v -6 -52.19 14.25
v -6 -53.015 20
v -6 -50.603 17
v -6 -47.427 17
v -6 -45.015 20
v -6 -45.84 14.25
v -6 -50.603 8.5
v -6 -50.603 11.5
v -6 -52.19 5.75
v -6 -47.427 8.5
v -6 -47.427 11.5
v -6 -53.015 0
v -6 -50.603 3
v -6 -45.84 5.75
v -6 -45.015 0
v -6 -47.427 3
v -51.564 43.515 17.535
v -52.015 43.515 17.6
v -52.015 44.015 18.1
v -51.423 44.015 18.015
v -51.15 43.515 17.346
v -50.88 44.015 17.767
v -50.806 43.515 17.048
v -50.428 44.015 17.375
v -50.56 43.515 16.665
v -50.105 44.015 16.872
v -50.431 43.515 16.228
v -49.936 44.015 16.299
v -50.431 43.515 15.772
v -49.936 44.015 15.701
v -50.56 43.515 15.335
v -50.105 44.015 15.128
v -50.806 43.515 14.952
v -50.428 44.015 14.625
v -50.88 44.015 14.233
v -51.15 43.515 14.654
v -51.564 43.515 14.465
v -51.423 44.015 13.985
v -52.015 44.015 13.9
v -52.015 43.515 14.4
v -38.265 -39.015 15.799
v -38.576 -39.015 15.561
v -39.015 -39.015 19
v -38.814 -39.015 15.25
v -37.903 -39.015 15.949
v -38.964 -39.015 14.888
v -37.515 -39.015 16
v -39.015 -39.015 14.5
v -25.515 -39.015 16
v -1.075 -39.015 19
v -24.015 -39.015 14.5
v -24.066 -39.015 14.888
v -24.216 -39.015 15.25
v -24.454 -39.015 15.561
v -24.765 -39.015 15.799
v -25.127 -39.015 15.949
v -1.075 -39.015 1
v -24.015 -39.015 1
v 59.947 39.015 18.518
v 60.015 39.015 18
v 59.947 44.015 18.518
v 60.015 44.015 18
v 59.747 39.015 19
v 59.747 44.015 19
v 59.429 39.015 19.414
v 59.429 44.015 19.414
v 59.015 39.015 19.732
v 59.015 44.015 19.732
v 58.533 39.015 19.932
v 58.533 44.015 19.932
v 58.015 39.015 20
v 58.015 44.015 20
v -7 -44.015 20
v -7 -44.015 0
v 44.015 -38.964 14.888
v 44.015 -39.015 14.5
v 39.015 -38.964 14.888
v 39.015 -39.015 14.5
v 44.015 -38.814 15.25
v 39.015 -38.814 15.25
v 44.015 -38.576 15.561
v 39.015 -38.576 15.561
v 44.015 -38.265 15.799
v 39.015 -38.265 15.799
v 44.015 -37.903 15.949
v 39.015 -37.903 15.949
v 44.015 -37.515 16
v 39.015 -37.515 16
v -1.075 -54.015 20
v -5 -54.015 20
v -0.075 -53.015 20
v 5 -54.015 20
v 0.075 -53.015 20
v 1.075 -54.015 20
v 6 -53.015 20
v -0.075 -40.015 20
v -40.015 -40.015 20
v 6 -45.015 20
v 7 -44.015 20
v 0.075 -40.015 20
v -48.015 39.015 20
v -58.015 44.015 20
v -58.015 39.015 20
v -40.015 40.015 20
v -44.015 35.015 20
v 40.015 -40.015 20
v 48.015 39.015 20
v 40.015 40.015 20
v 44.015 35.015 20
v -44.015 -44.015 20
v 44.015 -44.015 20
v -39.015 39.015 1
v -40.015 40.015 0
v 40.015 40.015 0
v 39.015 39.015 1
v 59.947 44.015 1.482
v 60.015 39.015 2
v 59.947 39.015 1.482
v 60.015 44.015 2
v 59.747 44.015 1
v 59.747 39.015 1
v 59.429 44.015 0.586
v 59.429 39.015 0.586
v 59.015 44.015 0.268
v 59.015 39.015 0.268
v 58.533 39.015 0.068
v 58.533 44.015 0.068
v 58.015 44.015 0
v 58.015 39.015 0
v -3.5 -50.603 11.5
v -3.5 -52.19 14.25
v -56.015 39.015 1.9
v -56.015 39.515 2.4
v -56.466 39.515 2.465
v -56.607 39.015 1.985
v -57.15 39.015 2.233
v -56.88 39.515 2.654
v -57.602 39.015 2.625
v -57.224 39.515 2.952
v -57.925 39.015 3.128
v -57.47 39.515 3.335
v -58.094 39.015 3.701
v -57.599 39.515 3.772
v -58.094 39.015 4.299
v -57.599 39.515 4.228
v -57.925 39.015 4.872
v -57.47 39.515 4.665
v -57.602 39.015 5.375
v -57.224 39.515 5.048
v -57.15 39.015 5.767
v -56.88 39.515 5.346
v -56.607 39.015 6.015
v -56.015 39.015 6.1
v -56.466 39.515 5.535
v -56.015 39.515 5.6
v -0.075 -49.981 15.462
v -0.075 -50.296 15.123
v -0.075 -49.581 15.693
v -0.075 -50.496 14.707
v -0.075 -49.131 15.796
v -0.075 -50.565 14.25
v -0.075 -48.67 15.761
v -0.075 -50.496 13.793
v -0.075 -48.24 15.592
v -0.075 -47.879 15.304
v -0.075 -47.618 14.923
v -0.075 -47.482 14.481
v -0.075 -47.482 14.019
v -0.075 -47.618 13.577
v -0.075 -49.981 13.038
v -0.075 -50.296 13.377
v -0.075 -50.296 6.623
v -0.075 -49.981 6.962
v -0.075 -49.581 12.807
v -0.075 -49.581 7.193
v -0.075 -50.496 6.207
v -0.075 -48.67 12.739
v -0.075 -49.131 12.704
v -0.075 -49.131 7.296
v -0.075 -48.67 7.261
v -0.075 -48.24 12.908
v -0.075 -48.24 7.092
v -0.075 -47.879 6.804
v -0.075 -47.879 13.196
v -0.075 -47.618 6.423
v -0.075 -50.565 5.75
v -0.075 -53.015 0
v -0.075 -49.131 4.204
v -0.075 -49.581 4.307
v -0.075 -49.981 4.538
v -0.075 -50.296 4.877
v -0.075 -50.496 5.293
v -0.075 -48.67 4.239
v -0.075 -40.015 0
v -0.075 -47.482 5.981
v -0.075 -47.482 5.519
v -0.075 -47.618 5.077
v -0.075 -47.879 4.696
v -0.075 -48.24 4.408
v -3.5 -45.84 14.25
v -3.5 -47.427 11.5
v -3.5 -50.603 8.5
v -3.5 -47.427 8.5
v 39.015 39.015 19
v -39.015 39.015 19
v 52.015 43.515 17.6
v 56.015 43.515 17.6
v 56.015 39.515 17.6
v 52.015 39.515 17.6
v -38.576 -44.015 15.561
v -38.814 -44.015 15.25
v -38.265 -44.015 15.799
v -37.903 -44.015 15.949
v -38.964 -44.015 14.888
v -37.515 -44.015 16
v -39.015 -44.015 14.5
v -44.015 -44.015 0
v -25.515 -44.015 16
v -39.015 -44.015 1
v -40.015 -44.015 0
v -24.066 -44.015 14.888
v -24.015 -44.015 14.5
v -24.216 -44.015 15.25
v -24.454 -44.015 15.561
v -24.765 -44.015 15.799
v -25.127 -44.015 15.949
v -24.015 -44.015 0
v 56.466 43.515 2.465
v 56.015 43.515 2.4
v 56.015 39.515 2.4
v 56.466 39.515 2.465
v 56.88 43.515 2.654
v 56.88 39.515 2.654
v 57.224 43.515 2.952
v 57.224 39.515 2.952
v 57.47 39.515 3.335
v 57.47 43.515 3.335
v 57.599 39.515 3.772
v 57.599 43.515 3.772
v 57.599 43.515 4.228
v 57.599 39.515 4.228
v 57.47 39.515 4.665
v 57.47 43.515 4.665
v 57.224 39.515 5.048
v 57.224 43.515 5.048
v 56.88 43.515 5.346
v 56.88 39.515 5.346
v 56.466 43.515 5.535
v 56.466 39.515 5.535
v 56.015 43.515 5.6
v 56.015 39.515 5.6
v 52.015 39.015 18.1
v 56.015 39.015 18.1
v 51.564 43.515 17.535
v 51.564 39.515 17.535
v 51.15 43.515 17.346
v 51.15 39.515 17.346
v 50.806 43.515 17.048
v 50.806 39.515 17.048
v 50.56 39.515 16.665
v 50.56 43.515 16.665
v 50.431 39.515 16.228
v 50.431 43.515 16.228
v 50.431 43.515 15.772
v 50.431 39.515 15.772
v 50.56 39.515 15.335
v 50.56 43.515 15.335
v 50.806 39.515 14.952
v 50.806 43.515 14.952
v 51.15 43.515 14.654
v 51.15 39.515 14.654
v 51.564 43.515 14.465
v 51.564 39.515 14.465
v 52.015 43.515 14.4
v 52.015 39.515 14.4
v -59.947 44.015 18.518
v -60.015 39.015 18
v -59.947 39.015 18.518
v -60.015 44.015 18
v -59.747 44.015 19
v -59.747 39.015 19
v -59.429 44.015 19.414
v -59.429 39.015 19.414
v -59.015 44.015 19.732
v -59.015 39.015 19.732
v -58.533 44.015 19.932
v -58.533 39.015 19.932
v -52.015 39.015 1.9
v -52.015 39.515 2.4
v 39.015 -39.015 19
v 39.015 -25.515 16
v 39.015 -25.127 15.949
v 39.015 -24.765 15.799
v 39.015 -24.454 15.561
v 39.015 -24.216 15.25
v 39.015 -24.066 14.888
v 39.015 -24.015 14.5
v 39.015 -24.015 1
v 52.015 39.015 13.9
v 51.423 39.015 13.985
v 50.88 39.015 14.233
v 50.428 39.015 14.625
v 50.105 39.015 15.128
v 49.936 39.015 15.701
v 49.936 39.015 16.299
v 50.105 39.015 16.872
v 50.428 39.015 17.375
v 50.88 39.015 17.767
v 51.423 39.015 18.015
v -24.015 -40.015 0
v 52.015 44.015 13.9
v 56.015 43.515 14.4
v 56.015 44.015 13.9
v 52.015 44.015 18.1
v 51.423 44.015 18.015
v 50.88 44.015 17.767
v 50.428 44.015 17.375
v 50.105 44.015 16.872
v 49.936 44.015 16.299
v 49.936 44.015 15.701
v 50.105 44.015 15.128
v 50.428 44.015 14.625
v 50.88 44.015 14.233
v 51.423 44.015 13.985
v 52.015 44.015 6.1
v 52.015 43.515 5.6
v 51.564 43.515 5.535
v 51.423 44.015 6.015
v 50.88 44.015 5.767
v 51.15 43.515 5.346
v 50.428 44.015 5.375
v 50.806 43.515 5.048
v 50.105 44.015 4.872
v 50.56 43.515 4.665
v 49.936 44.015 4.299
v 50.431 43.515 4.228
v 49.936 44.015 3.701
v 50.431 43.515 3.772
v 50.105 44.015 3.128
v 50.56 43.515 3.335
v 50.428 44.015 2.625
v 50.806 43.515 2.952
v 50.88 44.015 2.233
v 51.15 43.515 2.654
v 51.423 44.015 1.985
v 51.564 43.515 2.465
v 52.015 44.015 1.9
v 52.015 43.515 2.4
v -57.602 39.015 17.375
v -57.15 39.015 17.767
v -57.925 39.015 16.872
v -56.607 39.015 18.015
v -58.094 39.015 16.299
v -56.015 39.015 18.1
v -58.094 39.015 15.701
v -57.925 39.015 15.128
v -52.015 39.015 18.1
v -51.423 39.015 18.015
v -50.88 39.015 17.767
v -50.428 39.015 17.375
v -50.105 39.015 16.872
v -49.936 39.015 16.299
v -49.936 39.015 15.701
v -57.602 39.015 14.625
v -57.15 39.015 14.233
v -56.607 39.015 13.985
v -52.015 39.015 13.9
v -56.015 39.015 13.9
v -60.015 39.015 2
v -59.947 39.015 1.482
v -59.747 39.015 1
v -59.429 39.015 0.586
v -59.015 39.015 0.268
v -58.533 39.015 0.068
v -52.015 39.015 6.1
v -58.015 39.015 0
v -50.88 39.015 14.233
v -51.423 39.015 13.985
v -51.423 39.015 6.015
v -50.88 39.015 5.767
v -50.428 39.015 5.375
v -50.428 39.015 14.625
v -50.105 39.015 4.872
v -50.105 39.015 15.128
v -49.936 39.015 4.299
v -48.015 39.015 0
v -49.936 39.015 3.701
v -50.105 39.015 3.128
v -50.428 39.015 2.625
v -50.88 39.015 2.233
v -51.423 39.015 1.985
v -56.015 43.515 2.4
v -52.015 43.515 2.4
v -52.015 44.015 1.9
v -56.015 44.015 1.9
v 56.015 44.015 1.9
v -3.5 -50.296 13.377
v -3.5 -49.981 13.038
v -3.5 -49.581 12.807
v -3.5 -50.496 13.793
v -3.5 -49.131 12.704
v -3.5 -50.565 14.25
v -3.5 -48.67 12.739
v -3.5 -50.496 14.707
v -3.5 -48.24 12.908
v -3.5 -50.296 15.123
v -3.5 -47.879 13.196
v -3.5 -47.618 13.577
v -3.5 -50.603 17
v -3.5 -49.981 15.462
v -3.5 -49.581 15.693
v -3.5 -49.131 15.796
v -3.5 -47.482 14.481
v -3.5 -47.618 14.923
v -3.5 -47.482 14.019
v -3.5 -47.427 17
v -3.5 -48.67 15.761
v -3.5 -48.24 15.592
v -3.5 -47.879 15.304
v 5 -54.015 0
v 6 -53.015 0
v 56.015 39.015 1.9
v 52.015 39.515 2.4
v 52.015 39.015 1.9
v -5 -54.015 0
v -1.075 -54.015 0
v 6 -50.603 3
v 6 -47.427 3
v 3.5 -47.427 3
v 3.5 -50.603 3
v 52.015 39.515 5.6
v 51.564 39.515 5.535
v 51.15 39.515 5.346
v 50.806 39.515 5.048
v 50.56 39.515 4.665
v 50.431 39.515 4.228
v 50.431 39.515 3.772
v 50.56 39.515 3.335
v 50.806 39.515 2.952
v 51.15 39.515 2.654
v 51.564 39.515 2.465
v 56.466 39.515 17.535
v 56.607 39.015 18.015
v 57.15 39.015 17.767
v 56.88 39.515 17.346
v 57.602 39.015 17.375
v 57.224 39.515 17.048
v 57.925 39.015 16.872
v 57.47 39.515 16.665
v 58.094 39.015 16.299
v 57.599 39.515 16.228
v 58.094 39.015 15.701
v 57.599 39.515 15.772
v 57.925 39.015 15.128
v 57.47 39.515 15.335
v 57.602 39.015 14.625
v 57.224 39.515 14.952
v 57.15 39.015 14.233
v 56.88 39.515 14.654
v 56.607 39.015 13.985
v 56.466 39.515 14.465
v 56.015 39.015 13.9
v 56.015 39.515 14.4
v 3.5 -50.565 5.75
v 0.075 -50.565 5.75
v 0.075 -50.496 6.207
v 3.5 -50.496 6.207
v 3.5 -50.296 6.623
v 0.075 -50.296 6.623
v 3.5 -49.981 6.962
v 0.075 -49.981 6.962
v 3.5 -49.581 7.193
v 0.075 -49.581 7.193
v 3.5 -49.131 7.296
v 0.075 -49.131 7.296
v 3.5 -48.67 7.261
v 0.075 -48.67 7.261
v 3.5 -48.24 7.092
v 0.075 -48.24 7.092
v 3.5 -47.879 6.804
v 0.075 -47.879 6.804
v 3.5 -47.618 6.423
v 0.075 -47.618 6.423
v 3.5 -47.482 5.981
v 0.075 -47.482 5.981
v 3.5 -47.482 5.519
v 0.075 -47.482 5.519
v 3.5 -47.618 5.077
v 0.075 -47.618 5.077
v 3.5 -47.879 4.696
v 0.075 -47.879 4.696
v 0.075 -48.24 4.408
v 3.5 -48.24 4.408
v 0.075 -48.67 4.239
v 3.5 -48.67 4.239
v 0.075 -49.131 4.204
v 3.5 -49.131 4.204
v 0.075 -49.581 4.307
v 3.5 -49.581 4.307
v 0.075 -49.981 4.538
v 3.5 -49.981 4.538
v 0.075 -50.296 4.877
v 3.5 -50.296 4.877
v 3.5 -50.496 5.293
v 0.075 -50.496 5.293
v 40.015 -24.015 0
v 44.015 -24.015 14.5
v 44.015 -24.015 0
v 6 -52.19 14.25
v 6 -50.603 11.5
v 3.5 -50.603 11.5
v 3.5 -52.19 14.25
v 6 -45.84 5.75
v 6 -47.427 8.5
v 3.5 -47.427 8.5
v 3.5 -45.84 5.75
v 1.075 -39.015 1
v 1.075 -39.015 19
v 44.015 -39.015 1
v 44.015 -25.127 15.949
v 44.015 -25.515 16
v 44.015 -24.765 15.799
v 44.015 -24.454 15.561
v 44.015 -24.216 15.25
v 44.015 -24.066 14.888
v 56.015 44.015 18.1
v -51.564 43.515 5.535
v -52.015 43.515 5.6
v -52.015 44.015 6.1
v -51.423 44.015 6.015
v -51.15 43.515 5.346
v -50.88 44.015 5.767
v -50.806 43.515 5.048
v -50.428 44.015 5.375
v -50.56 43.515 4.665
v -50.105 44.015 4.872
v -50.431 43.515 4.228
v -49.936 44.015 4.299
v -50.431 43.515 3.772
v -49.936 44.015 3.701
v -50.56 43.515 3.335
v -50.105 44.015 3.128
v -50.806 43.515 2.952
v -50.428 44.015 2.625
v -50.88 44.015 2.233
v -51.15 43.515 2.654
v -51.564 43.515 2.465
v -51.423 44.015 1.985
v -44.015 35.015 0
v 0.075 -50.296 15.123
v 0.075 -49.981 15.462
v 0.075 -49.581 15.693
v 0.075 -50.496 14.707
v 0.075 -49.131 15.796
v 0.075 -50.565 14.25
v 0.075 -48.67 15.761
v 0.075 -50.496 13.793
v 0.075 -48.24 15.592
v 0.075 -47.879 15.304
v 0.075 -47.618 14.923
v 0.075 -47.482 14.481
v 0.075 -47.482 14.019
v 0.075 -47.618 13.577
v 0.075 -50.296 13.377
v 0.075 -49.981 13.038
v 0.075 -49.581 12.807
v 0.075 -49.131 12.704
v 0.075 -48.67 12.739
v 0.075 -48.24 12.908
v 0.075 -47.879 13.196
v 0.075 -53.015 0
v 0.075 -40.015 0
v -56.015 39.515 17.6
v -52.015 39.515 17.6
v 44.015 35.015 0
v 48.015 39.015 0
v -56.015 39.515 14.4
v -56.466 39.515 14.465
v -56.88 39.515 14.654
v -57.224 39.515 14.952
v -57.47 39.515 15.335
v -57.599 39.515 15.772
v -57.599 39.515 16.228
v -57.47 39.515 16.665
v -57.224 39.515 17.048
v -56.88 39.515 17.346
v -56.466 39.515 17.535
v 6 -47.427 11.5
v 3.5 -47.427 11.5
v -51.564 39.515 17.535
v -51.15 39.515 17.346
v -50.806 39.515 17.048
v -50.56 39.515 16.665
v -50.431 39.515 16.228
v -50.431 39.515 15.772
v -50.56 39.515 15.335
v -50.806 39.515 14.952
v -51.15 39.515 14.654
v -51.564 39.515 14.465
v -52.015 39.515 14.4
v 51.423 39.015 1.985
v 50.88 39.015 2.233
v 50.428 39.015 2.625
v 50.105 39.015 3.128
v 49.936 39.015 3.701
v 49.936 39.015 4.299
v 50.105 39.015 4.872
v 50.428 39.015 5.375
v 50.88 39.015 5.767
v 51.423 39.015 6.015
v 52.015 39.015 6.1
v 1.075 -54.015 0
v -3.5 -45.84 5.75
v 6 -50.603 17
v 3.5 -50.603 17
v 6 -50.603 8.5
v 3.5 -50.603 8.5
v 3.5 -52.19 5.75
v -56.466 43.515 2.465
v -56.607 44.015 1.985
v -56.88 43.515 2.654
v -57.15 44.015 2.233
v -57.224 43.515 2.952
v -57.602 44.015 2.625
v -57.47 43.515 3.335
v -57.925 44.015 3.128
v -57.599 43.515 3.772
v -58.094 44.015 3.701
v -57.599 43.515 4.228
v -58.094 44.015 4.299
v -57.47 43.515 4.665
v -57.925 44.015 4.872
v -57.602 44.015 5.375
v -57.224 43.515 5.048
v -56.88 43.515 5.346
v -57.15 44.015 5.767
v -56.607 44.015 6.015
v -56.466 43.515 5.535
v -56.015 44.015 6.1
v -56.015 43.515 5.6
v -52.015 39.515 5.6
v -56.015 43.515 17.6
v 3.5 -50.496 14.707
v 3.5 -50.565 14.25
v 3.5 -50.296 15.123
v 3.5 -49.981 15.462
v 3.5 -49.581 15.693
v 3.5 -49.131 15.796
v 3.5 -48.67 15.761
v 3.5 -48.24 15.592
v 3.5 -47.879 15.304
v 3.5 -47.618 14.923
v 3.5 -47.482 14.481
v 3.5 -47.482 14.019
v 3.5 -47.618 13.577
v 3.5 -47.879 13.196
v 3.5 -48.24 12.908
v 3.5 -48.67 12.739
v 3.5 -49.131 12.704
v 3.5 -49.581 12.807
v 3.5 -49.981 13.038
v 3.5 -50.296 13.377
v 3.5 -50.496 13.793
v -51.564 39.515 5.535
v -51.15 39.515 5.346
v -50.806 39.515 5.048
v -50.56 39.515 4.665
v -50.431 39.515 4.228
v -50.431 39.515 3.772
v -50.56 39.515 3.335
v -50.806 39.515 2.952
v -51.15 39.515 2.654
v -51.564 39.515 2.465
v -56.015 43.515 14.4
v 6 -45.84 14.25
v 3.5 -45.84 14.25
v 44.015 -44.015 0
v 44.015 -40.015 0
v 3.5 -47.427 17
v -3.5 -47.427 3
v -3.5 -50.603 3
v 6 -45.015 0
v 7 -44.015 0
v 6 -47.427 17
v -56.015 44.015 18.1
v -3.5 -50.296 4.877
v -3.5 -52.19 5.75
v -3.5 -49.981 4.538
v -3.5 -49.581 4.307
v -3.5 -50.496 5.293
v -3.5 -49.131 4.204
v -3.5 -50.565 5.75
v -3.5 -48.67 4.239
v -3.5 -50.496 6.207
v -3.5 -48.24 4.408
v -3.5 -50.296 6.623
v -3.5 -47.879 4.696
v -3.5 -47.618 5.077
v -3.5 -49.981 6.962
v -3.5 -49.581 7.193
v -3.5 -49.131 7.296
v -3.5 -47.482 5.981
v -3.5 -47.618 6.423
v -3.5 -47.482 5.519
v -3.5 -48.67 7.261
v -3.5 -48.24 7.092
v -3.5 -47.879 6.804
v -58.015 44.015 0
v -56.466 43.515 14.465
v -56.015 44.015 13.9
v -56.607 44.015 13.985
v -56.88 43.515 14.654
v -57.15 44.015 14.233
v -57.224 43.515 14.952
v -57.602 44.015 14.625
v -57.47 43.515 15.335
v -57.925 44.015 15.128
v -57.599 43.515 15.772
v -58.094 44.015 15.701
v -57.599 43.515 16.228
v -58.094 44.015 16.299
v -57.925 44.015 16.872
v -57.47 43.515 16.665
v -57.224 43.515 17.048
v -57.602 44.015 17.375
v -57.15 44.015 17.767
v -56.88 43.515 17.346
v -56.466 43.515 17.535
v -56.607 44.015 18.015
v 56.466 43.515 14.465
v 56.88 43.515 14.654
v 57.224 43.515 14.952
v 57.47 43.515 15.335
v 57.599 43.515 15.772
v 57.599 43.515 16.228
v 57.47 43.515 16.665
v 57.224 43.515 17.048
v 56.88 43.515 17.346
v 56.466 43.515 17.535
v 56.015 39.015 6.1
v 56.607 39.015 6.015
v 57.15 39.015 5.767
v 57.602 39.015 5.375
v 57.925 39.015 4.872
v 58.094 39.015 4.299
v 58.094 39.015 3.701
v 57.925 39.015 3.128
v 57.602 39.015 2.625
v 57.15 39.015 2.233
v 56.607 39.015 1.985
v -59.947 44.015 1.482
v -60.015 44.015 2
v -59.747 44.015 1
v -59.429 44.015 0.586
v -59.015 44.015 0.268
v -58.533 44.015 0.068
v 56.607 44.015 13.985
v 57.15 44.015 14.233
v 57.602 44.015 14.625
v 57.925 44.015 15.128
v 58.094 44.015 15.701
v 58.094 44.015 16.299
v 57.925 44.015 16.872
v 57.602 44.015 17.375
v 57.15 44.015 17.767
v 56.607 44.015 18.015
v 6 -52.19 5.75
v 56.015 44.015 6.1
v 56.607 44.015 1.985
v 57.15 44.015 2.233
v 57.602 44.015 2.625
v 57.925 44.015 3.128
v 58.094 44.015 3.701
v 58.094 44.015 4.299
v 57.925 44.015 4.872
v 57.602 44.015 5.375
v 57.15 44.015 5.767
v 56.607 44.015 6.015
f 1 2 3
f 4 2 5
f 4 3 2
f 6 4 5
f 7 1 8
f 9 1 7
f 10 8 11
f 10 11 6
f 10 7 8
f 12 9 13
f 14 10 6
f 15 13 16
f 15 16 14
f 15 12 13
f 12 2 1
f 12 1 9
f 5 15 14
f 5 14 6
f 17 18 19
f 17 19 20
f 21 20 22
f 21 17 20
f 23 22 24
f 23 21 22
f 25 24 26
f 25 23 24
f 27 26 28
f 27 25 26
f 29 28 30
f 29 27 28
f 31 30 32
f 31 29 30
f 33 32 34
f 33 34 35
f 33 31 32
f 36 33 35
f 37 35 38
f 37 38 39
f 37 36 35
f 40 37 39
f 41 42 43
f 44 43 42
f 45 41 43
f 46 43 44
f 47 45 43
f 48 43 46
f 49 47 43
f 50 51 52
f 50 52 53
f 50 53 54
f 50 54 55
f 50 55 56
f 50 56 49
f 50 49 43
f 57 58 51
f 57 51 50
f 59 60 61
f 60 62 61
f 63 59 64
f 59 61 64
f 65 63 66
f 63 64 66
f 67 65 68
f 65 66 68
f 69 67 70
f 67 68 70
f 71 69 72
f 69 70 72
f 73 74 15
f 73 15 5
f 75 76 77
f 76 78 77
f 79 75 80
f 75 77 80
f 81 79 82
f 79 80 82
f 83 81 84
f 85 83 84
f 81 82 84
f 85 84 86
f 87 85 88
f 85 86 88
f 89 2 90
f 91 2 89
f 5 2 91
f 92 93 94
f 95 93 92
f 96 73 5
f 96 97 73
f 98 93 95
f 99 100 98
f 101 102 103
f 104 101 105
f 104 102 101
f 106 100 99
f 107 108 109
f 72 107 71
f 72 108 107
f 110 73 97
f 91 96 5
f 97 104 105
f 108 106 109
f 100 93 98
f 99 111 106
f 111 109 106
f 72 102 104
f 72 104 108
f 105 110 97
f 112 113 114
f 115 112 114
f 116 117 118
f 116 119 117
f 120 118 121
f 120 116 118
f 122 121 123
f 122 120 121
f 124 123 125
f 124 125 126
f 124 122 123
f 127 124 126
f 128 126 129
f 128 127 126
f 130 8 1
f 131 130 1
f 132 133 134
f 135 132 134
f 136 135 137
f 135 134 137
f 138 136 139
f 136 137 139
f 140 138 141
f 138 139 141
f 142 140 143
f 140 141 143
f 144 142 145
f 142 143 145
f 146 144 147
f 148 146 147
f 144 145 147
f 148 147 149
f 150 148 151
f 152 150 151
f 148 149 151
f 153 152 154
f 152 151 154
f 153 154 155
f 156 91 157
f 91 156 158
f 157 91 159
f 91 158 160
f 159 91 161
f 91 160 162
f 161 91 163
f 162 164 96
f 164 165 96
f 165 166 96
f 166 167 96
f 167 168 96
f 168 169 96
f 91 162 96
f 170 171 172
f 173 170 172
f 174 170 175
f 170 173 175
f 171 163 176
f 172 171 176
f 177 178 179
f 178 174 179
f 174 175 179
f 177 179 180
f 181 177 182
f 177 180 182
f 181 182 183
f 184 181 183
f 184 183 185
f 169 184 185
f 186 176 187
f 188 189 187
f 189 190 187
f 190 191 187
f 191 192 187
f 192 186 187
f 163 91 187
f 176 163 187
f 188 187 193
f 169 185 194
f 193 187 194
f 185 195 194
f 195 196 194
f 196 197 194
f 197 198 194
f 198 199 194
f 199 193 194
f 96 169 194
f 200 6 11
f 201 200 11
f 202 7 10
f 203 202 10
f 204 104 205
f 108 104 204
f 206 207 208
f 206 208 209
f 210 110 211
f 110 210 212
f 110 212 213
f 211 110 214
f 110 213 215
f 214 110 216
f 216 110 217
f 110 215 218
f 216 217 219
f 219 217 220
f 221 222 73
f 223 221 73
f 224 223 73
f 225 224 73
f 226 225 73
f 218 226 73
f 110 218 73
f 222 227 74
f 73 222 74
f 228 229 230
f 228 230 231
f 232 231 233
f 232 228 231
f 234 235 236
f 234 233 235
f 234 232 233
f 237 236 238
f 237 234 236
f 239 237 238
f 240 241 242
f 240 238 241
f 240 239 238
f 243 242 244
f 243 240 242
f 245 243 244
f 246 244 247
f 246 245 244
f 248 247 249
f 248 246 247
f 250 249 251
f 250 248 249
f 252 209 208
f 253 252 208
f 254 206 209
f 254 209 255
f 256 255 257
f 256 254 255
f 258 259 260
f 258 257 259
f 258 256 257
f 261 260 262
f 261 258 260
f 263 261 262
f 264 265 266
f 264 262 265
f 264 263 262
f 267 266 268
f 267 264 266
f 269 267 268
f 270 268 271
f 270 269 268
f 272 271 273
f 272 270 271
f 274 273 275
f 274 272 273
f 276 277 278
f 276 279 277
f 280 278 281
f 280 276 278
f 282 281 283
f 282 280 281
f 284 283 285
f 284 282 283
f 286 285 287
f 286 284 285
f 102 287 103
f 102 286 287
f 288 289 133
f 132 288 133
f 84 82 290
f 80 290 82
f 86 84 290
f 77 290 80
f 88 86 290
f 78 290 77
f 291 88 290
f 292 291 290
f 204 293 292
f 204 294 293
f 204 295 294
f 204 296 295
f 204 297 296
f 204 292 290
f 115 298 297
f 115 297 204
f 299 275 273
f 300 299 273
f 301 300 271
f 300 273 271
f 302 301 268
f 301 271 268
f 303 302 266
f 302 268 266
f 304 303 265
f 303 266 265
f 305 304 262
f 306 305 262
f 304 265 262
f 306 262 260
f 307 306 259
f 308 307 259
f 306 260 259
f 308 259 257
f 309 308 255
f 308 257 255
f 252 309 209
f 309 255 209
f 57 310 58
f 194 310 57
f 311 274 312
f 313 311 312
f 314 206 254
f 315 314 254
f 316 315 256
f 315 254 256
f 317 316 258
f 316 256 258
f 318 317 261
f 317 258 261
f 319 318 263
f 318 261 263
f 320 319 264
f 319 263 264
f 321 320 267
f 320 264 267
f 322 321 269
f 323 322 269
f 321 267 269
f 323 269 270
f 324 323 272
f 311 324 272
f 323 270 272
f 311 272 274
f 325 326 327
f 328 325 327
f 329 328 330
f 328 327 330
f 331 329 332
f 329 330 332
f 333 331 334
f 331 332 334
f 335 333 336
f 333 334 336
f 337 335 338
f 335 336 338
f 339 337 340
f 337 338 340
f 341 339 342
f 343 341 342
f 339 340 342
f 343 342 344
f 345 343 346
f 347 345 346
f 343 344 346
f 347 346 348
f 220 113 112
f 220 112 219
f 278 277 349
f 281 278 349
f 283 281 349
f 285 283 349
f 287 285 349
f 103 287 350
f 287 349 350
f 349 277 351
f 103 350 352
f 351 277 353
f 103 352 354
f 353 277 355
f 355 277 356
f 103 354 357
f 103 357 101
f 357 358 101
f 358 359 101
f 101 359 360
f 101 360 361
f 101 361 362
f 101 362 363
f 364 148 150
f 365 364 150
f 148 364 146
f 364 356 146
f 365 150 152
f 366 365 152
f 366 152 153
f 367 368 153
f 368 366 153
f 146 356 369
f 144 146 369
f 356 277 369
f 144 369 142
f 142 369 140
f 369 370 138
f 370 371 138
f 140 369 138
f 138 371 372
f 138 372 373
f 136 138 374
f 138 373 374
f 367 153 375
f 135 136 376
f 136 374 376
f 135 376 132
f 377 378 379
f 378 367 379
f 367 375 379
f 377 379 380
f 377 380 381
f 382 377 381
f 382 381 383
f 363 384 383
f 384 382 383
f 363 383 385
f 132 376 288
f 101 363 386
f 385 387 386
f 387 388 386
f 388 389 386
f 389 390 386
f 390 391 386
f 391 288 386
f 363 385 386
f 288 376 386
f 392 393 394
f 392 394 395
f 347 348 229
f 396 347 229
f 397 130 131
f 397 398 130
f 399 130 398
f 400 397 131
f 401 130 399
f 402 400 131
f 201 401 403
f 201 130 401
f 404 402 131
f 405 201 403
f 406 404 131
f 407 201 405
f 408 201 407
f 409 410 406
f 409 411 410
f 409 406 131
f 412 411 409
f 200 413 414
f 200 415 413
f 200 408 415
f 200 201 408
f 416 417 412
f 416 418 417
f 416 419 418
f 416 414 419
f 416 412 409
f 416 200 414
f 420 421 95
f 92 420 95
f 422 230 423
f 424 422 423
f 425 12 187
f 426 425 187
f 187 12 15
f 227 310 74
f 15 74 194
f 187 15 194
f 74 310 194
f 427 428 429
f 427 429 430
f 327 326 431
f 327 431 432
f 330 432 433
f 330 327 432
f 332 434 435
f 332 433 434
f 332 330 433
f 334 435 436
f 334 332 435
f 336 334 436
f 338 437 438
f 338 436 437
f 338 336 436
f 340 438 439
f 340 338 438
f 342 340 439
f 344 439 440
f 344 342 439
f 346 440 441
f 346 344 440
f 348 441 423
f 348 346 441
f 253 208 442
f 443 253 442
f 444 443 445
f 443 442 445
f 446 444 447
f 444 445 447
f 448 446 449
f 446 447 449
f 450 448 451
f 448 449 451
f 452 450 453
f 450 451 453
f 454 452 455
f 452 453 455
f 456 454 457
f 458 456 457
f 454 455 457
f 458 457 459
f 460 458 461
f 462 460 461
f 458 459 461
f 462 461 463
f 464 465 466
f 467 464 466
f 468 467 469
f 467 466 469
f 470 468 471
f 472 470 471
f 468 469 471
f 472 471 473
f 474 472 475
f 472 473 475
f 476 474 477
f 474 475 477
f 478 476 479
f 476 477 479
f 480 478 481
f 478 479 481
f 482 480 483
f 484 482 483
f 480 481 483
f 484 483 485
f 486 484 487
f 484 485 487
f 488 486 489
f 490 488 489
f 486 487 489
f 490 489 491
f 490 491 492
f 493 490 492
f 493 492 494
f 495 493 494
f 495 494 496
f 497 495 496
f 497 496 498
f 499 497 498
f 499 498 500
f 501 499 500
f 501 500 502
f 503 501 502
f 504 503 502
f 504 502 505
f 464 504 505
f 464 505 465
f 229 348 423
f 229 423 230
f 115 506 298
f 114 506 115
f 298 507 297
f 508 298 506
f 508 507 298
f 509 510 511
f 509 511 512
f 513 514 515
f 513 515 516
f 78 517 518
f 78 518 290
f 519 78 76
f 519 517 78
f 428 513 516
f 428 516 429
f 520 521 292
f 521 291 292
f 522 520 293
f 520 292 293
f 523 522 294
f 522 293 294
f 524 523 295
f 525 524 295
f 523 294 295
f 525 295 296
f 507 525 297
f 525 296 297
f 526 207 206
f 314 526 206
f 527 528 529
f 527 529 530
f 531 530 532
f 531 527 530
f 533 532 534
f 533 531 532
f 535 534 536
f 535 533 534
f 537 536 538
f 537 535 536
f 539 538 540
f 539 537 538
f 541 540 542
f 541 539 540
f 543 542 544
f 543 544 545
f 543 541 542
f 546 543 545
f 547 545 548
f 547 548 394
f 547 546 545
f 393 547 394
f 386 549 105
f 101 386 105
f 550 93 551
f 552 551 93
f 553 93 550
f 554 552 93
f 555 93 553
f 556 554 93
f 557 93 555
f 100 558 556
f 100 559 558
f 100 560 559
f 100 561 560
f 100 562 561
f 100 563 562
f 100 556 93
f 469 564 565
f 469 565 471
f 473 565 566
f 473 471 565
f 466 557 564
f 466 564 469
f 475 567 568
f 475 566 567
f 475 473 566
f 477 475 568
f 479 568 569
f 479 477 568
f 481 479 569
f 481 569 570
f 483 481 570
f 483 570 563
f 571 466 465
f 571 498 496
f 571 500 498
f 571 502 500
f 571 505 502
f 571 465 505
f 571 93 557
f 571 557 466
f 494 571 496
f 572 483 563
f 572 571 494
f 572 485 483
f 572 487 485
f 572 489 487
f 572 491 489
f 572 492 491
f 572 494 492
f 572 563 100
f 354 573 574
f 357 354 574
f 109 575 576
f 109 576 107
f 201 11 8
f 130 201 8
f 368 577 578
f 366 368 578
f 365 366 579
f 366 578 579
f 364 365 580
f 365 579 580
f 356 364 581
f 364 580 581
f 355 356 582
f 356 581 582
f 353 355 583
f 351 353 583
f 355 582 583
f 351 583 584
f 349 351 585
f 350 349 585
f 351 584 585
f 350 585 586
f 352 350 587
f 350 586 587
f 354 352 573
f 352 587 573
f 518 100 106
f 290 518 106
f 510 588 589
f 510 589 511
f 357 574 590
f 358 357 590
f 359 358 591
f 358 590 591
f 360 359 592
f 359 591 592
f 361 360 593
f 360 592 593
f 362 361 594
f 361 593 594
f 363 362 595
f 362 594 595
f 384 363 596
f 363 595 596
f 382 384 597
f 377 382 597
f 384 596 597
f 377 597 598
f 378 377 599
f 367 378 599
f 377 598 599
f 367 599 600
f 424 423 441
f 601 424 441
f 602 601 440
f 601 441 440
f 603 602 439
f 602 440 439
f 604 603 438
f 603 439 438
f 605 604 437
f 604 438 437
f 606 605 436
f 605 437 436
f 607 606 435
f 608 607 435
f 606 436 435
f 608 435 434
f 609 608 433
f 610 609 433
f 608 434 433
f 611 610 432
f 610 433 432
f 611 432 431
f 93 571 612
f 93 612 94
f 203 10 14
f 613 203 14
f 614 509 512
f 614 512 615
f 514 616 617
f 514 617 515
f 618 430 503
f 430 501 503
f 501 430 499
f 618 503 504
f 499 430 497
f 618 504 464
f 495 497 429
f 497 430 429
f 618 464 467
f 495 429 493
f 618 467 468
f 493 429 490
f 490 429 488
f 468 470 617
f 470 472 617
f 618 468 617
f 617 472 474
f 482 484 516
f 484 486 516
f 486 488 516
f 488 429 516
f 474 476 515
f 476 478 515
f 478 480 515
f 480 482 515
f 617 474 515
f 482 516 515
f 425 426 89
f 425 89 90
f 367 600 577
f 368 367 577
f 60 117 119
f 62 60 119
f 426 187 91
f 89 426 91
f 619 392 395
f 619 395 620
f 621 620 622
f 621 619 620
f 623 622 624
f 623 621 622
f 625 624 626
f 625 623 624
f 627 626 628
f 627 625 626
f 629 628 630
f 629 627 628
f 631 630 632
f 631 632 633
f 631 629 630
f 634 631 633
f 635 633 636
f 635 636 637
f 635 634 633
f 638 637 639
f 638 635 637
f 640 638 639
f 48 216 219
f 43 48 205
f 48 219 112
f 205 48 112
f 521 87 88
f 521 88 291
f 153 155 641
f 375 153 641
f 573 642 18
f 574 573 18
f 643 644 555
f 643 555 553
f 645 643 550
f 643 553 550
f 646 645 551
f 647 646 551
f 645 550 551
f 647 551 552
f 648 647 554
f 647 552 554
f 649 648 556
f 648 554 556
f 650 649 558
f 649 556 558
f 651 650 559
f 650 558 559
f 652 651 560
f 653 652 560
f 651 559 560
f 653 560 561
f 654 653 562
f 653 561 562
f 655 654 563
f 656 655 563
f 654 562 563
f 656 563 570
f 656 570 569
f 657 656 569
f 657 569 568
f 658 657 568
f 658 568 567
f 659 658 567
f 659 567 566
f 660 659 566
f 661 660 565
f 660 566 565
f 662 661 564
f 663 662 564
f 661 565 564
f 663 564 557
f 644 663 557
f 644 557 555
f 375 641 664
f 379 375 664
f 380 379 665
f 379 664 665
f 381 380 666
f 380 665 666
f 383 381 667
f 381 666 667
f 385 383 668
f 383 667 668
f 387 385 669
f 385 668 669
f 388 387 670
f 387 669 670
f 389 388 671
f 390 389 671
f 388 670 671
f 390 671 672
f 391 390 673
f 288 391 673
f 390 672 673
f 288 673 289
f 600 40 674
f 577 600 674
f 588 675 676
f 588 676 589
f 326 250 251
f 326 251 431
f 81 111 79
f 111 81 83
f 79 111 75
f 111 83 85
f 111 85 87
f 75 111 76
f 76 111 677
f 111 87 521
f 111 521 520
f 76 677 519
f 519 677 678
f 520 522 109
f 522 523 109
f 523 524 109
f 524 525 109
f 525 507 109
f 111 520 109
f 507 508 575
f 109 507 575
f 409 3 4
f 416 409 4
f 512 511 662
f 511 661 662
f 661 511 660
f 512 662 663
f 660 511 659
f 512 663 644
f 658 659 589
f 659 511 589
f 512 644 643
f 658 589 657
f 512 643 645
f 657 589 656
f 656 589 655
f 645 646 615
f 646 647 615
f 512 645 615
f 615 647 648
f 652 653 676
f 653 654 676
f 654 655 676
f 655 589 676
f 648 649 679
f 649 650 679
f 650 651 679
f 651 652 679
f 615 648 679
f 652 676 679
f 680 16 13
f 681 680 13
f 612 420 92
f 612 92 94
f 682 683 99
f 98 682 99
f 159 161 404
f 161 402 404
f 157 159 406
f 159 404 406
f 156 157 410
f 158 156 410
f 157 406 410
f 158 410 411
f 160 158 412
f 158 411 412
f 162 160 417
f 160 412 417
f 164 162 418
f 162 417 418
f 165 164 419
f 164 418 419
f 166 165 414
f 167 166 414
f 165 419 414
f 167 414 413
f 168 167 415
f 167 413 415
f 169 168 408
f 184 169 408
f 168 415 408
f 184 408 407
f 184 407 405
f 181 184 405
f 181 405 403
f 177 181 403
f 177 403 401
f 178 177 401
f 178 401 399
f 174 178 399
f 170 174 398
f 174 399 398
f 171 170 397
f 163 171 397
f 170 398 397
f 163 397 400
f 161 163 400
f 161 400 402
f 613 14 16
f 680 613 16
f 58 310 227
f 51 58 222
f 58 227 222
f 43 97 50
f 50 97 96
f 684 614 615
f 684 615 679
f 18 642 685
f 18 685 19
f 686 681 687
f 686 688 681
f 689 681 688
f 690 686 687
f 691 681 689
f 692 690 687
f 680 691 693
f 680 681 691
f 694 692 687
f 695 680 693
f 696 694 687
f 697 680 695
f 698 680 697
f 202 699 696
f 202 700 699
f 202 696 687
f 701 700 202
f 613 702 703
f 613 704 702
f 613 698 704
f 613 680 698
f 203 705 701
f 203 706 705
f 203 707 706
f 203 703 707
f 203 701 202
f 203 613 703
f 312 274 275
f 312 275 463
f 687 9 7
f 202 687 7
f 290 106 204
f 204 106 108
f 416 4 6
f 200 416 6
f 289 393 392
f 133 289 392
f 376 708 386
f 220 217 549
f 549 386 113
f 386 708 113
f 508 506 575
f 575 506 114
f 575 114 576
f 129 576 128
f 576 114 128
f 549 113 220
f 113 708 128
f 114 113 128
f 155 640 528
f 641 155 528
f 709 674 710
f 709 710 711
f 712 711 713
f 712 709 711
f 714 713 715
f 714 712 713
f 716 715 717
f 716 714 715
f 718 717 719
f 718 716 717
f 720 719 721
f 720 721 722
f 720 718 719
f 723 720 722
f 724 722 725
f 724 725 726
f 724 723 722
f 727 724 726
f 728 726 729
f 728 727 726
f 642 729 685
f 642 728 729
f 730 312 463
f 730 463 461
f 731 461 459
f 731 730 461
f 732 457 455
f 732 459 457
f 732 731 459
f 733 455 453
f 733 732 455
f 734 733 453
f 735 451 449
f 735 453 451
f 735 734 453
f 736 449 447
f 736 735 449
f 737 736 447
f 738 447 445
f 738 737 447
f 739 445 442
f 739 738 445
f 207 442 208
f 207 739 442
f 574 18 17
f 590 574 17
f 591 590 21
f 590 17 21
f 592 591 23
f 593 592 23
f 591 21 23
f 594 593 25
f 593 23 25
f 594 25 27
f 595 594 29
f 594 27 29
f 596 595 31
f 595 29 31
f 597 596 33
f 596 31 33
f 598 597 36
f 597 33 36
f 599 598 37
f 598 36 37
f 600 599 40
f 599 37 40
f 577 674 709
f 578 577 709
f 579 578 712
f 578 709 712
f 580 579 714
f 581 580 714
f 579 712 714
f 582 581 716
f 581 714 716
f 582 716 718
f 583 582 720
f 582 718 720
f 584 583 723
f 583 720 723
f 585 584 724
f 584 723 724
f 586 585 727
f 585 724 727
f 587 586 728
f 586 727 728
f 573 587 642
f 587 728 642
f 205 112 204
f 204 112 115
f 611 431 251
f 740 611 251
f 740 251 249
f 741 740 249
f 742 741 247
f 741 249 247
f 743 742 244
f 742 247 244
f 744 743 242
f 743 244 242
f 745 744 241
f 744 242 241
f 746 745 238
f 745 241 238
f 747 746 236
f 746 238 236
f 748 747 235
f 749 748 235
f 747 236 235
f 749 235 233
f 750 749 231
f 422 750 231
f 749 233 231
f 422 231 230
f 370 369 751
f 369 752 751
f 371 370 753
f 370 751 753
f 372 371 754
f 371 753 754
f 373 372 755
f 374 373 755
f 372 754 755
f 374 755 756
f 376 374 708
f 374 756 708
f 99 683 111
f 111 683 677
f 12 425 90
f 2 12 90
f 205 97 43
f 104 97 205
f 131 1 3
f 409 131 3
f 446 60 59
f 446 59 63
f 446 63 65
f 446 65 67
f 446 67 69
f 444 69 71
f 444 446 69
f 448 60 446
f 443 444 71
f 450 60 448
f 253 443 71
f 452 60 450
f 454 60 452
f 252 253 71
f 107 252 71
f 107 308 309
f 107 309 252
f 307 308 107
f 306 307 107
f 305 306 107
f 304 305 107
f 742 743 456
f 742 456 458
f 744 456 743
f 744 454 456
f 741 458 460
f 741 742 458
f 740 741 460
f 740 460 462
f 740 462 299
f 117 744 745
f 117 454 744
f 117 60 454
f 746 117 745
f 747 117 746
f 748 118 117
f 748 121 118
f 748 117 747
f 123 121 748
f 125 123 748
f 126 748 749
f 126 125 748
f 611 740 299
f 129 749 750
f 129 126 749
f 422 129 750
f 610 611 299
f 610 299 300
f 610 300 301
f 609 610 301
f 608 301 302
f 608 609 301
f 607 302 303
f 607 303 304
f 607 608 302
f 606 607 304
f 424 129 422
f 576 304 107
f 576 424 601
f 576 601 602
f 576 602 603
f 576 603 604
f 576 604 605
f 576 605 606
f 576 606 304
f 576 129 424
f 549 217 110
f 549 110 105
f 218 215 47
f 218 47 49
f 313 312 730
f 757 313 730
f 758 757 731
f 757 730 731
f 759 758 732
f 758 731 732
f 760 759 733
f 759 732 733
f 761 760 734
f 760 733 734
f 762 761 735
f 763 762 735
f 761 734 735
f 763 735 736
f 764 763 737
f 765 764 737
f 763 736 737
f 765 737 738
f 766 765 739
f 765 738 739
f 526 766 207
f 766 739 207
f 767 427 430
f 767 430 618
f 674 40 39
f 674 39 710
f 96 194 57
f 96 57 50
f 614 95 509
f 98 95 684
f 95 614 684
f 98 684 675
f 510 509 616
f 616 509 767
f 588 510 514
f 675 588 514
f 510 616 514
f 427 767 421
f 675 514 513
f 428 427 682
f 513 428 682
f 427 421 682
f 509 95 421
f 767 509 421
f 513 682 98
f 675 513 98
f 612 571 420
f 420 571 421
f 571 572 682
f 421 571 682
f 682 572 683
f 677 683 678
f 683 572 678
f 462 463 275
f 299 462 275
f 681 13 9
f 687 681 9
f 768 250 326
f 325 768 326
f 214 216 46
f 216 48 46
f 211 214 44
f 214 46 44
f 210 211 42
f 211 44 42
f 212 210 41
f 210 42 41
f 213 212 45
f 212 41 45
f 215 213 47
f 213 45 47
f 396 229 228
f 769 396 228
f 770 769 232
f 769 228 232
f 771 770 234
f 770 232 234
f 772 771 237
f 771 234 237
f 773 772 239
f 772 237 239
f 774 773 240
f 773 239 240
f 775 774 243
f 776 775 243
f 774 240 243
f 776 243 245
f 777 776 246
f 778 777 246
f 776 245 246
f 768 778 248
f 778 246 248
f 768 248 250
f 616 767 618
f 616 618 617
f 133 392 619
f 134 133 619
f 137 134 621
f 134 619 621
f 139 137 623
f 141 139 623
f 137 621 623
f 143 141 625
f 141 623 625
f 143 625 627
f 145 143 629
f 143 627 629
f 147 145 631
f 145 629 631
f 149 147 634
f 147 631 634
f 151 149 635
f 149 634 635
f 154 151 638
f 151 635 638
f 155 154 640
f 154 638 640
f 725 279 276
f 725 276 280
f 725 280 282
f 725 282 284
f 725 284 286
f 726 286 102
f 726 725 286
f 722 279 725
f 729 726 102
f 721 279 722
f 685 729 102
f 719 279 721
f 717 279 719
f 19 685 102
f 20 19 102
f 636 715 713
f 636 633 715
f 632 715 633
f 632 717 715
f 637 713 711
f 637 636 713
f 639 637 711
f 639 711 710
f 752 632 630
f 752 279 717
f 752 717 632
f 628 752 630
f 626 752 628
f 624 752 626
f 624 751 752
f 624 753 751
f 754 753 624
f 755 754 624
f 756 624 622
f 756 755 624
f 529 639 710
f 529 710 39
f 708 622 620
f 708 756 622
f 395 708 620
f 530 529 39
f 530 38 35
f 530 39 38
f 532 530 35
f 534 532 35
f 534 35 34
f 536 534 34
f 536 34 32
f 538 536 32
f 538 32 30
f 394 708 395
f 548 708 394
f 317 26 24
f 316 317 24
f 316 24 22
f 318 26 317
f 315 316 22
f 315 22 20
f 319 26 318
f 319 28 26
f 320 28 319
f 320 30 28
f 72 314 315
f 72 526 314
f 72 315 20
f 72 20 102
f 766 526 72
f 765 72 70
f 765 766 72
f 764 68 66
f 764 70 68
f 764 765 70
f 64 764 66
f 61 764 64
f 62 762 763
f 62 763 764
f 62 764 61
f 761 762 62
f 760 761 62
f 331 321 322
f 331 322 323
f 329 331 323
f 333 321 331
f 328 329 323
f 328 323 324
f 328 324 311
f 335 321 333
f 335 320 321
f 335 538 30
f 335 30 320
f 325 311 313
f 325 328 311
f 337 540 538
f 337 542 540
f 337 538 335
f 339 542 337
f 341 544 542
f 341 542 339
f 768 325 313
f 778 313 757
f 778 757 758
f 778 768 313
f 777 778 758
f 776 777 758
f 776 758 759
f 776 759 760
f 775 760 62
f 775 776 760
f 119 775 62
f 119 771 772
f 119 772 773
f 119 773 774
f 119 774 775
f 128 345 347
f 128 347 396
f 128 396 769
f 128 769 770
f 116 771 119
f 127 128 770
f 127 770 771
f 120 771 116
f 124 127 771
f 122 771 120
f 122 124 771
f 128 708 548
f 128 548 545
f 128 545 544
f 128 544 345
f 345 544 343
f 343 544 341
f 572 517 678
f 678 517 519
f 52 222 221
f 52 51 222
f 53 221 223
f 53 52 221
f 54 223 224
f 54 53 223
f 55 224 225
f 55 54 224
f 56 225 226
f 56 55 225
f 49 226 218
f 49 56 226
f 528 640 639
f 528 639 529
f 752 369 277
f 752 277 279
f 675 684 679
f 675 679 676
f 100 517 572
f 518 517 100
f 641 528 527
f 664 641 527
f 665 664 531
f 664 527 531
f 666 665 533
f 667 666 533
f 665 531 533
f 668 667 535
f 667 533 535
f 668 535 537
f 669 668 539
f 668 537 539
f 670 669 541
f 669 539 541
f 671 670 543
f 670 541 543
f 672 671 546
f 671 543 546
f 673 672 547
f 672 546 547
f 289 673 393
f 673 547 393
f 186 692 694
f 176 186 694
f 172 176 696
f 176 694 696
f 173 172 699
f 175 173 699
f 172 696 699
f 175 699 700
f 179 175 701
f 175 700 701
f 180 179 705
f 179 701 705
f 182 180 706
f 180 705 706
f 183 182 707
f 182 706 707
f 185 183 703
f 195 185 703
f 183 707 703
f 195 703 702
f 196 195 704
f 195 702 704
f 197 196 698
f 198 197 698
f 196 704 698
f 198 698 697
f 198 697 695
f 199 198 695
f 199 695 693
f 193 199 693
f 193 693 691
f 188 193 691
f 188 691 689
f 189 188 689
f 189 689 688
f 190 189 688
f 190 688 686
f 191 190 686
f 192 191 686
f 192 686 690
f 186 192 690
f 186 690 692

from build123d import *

# Parameters (mm, degrees)
SKETCH1_W            = 88.03
SKETCH1_H            = 88.03
SKETCH1_W_2          = 78.03
SKETCH1_H_2          = 78.03
BOSS_EXTRUDE1_DEPTH  = 20
SKETCH2_W            = 16
SKETCH2_H            = 15
CUT_EXTRUDE1_DEPTH   = 20
SKETCH5_W            = 12
SKETCH5_H            = 10
BOSS_EXTRUDE2_DEPTH  = 20
SKETCH3_W            = 0.15
SKETCH3_H            = 15
CUT_EXTRUDE2_DEPTH   = 73.490968058
CUT_EXTRUDE3_DEPTH   = 2.5
SKETCH7_R            = 1.55
CUT_EXTRUDE4_DEPTH   = 77.283159675
SKETCH8_W            = 16
SKETCH8_H            = 5
BOSS_EXTRUDE3_DEPTH  = 20
CUT_EXTRUDE5_DEPTH   = 117.669109558
FILLET8_R            = 2
FILLET8_OF_MIRROR9_R = 2
CHAMFER1_SIZE        = 4
SKETCH10_W           = 15
SKETCH10_H           = 16
CUT_EXTRUDE6_DEPTH   = 15
FILLET7_R            = 1.5
CHAMFER2_SIZE        = 1
CHAMFER3_SIZE        = 0.5


with BuildPart() as part:
    # Sketch1 → Boss-Extrude1 (new body)
    with BuildSketch(Plane.XY):
        Rectangle(SKETCH1_W, SKETCH1_H)
        Rectangle(SKETCH1_W_2, SKETCH1_H_2, mode=Mode.SUBTRACT)
    extrude(amount=BOSS_EXTRUDE1_DEPTH)

    # Sketch2 → Cut-Extrude1 (cut)
    with BuildSketch(Plane(origin=(44.015, 0, 0), x_dir=(0, 0, -1), z_dir=(1, 0, 0))):
        with Locations((-8, -31.515)):
            Rectangle(SKETCH2_W, SKETCH2_H)
    extrude(amount=-CUT_EXTRUDE1_DEPTH, mode=Mode.SUBTRACT)

    # Sketch5 → Boss-Extrude2 (add)
    with BuildSketch(Plane(origin=(0, 0, 0), x_dir=(-1, 0, 0), z_dir=(0, 0, -1))):
        with Locations((0, -49.015)):
            Rectangle(SKETCH5_W, SKETCH5_H)
    extrude(amount=-BOSS_EXTRUDE2_DEPTH)

    # Sketch3 → Cut-Extrude2 (cut, through all)
    with BuildSketch(Plane(origin=(0, 0, 0), x_dir=(-1, 0, 0), z_dir=(0, 0, -1))):
        with Locations((0, -46.515)):
            Rectangle(SKETCH3_W, SKETCH3_H)
    extrude(amount=-CUT_EXTRUDE2_DEPTH, mode=Mode.SUBTRACT)

    # Sketch6 → Cut-Extrude3 (cut)
    with BuildSketch(Plane.ZY.offset(6)):
        Polygon((8.5, -47.42728676), (5.75, -45.839573519), (3, -47.42728676), (3, -50.60271324), (5.75, -52.190426481), (8.5, -50.60271324), align=None)
        Polygon((17, -47.42728676), (14.25, -45.839573519), (11.5, -47.42728676), (11.5, -50.60271324), (14.25, -52.190426481), (17, -50.60271324), align=None)
    cut_extrude3 = extrude(amount=-CUT_EXTRUDE3_DEPTH, mode=Mode.SUBTRACT)

    # Sketch7 → Cut-Extrude4 (cut, symmetric)
    with BuildSketch(Plane.ZY.offset(6)):
        with Locations(Location((5.75, -49.015, 0), (0, 0, 270))):
            Circle(SKETCH7_R)
        with Locations(Location((14.25, -49.015, 0), (0, 0, 270))):
            Circle(SKETCH7_R)
    cut_extrude4 = extrude(amount=CUT_EXTRUDE4_DEPTH, both=True, mode=Mode.SUBTRACT)

    # Sketch8 → Boss-Extrude3 (add)
    with BuildSketch(Plane(origin=(0, 0, 0), x_dir=(-1, 0, 0), z_dir=(0, 0, -1))):
        with Locations((-52.015, 41.515)):
            Rectangle(SKETCH8_W, SKETCH8_H)
    boss_extrude3 = extrude(amount=-BOSS_EXTRUDE3_DEPTH)

    # Sketch9 → Cut-Extrude5 (cut, through all)
    with BuildSketch(Plane(origin=(0, 44.015, 0), x_dir=(1, 0, 0), z_dir=(0, 1, 0))):
        with BuildLine():
            Line((52.015, -14.4), (56.015, -14.4))
            ThreePointArc((56.015, -14.4), (57.615, -16), (56.015, -17.6))
            Line((56.015, -17.6), (52.015, -17.6))
            ThreePointArc((52.015, -17.6), (50.415, -16), (52.015, -14.4))
        make_face()
        with BuildLine():
            Line((52.015, -2.4), (56.015, -2.4))
            ThreePointArc((56.015, -2.4), (57.615, -4), (56.015, -5.6))
            Line((56.015, -5.6), (52.015, -5.6))
            ThreePointArc((52.015, -5.6), (50.415, -4), (52.015, -2.4))
        make_face()
    cut_extrude5 = extrude(amount=-CUT_EXTRUDE5_DEPTH, mode=Mode.SUBTRACT)

    # Fillet8
    fillet8_edges = [part.edges().sort_by_distance(p)[0] for p in [
        (60.015, 41.515, 0),
        (60.015, 41.515, 20),
    ]]
    fillet(fillet8_edges, radius=FILLET8_R)

    # Mirror9: Cut-Extrude3, Cut-Extrude4, Boss-Extrude3, Cut-Extrude5 across plane
    add(cut_extrude3.mirror(Plane(origin=(0, 0, 0), x_dir=(0, 0, 1), z_dir=(1, 0, 0))), mode=Mode.SUBTRACT)
    add(cut_extrude4.mirror(Plane(origin=(0, 0, 0), x_dir=(0, 0, 1), z_dir=(1, 0, 0))), mode=Mode.SUBTRACT)
    add(boss_extrude3.mirror(Plane(origin=(0, 0, 0), x_dir=(0, 0, 1), z_dir=(1, 0, 0))))
    add(cut_extrude5.mirror(Plane(origin=(0, 0, 0), x_dir=(0, 0, 1), z_dir=(1, 0, 0))), mode=Mode.SUBTRACT)

    # Fillet8 of Mirror9
    fillet8_of_mirror9_edges = [part.edges().sort_by_distance(p)[0] for p in [
        (-60.015, 41.515, 0),
        (-60.015, 41.515, 20),
    ]]
    fillet(fillet8_of_mirror9_edges, radius=FILLET8_OF_MIRROR9_R)

    # Chamfer1
    chamfer1_edges = [part.edges().sort_by_distance(p)[0] for p in [
        (44.015, 39.015, 10),
        (-44.015, 39.015, 10),
    ]]
    chamfer(chamfer1_edges, length=CHAMFER1_SIZE)

    # Sketch10 → Cut-Extrude6 (cut)
    with BuildSketch(Plane.XZ.offset(44.015)):
        with Locations((-31.515, 8)):
            Rectangle(SKETCH10_W, SKETCH10_H)
    extrude(amount=-CUT_EXTRUDE6_DEPTH, mode=Mode.SUBTRACT)

    # Fillet7
    fillet7_edges = [part.edges().sort_by_distance(p)[0] for p in [
        (-39.015, -41.515, 16),
        (-24.015, -41.515, 16),
        (41.515, -39.015, 16),
        (41.515, -24.015, 16),
    ]]
    fillet(fillet7_edges, radius=FILLET7_R)

    # Chamfer2
    chamfer2_edges = [part.edges().sort_by_distance(p)[0] for p in [
        (0, 39.015, 0),
        (-39.015, -2.5, 0),
        (39.015, 0, 20),
        (0, 39.015, 20),
        (-39.015, 0, 20),
        (-19.545, -39.015, 20),
        (39.015, 7.5, 0),
        (-12.045, -39.015, 0),
        (-6, -54.015, 10),
        (-6, -44.015, 10),
        (6, -44.015, 10),
        (6, -54.015, 10),
        (22.045, -39.015, 0),
        (19.545, -39.015, 20),
        (0.075, -54.015, 10),
        (0.075, -39.015, 10),
        (-0.075, -39.015, 10),
        (-0.075, -54.015, 10),
    ]]
    chamfer(chamfer2_edges, length=CHAMFER2_SIZE)

    # Chamfer3
    chamfer3_edges = [part.edges().sort_by_distance(p)[0] for p in [
        (54.015, 39.015, 5.6),
        (57.615, 39.015, 4),
        (54.015, 39.015, 2.4),
        (50.415, 39.015, 4),
        (54.015, 39.015, 17.6),
        (57.615, 39.015, 16),
        (54.015, 39.015, 14.4),
        (50.415, 39.015, 16),
        (50.415, 44.015, 16),
        (54.015, 44.015, 17.6),
        (57.615, 44.015, 16),
        (54.015, 44.015, 14.4),
        (50.415, 44.015, 4),
        (54.015, 44.015, 5.6),
        (57.615, 44.015, 4),
        (54.015, 44.015, 2.4),
        (-54.015, 39.015, 2.4),
        (-57.615, 39.015, 4),
        (-54.015, 39.015, 5.6),
        (-50.415, 39.015, 4),
        (-54.015, 39.015, 14.4),
        (-57.615, 39.015, 16),
        (-54.015, 39.015, 17.6),
        (-50.415, 39.015, 16),
        (-50.415, 44.015, 16),
        (-54.015, 44.015, 17.6),
        (-57.615, 44.015, 16),
        (-54.015, 44.015, 14.4),
        (-50.415, 44.015, 4),
        (-54.015, 44.015, 5.6),
        (-57.615, 44.015, 4),
        (-54.015, 44.015, 2.4),
    ]]
    chamfer(chamfer3_edges, length=CHAMFER3_SIZE)


solid = part.part
